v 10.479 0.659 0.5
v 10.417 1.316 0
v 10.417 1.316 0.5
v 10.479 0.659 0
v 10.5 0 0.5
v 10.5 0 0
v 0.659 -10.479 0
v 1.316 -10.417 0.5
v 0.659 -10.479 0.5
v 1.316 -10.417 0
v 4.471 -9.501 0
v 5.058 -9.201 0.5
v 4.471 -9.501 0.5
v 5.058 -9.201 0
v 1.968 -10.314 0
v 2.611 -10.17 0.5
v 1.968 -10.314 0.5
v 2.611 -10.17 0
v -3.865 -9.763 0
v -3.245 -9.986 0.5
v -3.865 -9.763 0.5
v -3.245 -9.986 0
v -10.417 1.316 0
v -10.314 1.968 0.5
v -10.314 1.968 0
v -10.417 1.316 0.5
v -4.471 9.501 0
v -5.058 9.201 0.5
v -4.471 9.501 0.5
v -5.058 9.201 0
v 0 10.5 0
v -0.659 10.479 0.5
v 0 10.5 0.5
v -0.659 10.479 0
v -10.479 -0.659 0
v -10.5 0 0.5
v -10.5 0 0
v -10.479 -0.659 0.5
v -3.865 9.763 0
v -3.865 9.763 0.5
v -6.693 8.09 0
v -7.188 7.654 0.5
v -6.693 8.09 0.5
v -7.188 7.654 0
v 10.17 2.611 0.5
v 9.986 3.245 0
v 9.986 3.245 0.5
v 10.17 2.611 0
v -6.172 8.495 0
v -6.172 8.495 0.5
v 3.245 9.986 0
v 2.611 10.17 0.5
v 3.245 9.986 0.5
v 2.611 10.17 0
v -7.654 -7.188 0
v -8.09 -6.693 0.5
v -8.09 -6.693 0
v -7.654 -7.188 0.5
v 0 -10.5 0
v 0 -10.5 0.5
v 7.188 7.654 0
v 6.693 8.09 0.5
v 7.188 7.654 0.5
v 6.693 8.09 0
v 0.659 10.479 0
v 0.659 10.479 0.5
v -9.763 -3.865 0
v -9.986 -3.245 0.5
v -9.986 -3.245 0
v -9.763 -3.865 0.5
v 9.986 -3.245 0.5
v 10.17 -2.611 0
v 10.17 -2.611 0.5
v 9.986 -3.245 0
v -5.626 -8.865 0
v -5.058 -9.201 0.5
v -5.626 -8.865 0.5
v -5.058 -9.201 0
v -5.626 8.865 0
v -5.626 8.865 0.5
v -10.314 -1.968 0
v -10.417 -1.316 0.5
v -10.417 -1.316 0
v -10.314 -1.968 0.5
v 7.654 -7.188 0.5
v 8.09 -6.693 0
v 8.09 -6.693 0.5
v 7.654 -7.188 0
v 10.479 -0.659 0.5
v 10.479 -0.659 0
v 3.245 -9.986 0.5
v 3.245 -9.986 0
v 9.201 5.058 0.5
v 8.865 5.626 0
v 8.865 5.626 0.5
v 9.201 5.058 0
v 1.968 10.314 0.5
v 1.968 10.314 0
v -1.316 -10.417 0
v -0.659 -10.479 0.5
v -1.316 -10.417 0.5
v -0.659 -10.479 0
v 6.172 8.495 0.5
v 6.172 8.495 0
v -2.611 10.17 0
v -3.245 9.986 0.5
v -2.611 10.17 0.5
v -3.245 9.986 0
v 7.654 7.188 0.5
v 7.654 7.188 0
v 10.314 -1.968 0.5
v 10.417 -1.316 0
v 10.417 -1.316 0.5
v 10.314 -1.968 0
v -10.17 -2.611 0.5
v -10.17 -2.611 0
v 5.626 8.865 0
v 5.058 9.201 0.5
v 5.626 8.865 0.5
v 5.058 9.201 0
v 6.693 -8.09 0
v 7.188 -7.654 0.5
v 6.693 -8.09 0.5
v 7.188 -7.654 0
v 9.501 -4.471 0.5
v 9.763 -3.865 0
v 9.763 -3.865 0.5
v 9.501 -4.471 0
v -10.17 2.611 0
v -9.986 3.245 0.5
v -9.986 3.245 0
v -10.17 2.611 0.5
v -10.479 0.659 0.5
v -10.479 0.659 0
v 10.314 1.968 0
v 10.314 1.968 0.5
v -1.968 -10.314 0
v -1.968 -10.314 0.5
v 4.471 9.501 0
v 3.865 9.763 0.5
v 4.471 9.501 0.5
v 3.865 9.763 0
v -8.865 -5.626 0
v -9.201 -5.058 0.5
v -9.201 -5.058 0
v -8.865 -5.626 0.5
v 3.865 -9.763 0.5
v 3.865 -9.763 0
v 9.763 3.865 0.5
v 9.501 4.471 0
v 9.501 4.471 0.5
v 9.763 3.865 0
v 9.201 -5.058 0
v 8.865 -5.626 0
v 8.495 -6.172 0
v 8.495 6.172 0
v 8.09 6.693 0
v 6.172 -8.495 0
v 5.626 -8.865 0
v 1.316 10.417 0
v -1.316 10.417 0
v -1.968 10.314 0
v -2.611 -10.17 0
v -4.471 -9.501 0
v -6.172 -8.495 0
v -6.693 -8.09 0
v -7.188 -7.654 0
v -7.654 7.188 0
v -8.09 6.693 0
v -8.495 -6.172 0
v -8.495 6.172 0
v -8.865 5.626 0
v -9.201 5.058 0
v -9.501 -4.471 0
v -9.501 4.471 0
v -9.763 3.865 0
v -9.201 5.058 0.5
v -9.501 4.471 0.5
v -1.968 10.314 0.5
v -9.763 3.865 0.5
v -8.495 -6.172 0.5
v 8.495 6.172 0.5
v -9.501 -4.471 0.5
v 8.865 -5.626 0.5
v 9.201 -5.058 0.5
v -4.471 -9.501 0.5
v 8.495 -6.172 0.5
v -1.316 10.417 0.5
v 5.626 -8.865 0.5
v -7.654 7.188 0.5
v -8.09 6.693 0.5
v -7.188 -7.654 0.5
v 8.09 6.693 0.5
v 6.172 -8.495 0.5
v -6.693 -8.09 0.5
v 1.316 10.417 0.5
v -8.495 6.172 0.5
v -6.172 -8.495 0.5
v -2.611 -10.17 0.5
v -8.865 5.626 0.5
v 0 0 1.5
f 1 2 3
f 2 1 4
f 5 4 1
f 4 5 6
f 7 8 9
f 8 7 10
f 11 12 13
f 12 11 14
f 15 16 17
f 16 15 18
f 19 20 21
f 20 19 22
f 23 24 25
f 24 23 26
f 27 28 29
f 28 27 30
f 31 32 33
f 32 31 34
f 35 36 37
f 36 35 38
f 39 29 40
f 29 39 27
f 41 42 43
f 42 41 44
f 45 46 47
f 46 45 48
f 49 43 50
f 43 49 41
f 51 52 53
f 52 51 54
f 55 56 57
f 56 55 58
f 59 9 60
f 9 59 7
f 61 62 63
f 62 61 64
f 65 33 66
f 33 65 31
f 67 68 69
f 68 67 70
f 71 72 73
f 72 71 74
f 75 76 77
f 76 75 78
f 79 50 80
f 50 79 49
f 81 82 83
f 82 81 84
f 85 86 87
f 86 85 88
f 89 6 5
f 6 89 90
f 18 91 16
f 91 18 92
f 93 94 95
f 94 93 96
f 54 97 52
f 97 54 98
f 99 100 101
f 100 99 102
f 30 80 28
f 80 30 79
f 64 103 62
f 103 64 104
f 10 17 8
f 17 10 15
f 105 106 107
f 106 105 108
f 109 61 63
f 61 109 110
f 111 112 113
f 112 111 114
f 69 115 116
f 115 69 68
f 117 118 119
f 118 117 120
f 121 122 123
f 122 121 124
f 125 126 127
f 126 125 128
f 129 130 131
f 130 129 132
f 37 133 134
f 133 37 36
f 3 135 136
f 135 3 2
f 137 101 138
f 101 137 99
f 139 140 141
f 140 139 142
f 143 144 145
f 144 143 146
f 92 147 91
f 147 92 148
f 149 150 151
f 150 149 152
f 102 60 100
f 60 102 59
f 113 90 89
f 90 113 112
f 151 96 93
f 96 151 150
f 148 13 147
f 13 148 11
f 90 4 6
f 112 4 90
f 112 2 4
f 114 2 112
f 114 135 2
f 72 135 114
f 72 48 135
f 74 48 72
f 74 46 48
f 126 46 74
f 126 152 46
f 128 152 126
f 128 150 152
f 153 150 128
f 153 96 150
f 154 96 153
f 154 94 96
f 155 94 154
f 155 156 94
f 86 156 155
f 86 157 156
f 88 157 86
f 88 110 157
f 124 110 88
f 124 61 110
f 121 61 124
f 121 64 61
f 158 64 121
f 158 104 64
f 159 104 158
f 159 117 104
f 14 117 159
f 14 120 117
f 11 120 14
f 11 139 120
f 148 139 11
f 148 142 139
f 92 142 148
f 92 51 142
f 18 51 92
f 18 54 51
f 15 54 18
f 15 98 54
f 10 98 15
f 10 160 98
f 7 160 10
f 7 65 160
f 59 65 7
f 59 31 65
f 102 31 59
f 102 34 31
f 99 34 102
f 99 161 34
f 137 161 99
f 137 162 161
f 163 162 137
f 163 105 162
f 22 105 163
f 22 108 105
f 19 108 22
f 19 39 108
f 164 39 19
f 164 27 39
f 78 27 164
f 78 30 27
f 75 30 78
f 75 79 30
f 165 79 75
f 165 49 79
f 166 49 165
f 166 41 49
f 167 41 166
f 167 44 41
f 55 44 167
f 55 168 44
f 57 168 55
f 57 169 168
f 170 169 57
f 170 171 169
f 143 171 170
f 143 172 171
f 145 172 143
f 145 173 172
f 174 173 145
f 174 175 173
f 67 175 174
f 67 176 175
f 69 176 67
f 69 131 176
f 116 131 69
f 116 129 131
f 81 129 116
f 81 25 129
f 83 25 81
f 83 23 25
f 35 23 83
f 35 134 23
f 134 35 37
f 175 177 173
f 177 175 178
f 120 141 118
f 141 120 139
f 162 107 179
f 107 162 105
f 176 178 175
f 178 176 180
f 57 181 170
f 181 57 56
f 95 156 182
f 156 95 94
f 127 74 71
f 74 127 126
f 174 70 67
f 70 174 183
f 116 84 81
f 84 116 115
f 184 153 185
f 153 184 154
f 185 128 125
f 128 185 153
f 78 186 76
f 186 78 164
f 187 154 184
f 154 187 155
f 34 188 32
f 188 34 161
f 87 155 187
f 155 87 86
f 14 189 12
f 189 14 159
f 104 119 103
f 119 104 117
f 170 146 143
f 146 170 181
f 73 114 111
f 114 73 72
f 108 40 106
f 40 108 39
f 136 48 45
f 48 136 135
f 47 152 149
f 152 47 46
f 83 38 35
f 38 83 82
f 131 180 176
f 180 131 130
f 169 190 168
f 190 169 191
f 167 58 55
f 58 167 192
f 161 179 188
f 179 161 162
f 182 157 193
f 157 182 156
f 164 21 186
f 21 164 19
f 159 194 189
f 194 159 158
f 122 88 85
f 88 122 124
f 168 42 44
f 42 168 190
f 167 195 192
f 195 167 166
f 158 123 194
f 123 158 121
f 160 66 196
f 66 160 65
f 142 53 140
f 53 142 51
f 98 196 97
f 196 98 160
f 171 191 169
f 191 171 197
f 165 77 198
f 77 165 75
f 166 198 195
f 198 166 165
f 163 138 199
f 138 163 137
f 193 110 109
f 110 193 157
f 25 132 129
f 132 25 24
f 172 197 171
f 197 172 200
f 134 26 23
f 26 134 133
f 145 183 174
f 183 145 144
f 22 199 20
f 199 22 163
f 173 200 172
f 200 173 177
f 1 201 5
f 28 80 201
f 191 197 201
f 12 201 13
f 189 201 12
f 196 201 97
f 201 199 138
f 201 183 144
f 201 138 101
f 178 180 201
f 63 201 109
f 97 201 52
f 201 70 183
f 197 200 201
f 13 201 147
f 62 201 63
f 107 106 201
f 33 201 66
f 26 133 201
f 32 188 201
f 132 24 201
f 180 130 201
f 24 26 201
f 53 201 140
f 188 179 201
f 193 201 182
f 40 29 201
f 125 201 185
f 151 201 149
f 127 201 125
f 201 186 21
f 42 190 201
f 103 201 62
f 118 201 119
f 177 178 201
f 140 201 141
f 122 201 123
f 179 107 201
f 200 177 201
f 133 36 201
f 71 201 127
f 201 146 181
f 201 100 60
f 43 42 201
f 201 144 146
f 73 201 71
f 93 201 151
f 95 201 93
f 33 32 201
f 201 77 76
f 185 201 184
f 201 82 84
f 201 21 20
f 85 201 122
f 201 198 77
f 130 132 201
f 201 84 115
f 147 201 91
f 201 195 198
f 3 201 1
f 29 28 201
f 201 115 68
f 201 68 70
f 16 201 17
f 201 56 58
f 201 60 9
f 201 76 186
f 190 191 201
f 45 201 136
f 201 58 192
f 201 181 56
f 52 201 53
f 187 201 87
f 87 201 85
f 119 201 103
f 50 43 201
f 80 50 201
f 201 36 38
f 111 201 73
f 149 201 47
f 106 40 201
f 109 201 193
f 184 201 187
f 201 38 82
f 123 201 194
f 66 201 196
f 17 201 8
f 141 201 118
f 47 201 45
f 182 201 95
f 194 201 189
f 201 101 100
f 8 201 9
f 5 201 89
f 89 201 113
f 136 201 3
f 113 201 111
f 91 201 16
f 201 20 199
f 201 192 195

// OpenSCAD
$fn=100;
eps=1/128;

t = 0.1; // tolerance
a = 5; // led diameter
b = 4.12; // led height
at = a + t;
n = 9; // number of leds
w = 1; // space from led holes to edge
bw = 1; // bottom wall
h = 6; // plate height
d = 21; // outer diameter of ring
md = 5; // magnet diameter
mh = 6.2; // magnet height (two)
mdt = md+t;
mht = mh+t;
gw = 2; // glue wall
gww = 1; // glue wall width

echo("d", d, "h", h);

//difference() {
//    cylinder(h=h, d=d);
//    //translate([0,0,h+eps]) cylinder(h=gw, d=d-gww);
//    for(deg = [0 : 360/n : 360]) {
//        rotate([0,0,deg]) translate([d/2-at/2-w,0,bw]) cylinder(h=h+2, d=at);
//    }    
//    hull() {
//        translate([0,0,mdt/2+bw]) rotate([90,0,0]) cylinder(h=mht, d=mdt, center=true);
//        translate([0,0,mdt/2+mdt]) cube([mdt, mht, 1], center=true);
//    }
//}

cylinder(h=0.5, d=d);
translate([0,0,0.5]) cylinder(h=1, d1=d, d2=0);

//scale([1,1,0.5])
//difference() {
//    sphere(d=d);
//    sphere(d=15);
//    translate([0,0,-d/2])cube(d, center=true);
//}
